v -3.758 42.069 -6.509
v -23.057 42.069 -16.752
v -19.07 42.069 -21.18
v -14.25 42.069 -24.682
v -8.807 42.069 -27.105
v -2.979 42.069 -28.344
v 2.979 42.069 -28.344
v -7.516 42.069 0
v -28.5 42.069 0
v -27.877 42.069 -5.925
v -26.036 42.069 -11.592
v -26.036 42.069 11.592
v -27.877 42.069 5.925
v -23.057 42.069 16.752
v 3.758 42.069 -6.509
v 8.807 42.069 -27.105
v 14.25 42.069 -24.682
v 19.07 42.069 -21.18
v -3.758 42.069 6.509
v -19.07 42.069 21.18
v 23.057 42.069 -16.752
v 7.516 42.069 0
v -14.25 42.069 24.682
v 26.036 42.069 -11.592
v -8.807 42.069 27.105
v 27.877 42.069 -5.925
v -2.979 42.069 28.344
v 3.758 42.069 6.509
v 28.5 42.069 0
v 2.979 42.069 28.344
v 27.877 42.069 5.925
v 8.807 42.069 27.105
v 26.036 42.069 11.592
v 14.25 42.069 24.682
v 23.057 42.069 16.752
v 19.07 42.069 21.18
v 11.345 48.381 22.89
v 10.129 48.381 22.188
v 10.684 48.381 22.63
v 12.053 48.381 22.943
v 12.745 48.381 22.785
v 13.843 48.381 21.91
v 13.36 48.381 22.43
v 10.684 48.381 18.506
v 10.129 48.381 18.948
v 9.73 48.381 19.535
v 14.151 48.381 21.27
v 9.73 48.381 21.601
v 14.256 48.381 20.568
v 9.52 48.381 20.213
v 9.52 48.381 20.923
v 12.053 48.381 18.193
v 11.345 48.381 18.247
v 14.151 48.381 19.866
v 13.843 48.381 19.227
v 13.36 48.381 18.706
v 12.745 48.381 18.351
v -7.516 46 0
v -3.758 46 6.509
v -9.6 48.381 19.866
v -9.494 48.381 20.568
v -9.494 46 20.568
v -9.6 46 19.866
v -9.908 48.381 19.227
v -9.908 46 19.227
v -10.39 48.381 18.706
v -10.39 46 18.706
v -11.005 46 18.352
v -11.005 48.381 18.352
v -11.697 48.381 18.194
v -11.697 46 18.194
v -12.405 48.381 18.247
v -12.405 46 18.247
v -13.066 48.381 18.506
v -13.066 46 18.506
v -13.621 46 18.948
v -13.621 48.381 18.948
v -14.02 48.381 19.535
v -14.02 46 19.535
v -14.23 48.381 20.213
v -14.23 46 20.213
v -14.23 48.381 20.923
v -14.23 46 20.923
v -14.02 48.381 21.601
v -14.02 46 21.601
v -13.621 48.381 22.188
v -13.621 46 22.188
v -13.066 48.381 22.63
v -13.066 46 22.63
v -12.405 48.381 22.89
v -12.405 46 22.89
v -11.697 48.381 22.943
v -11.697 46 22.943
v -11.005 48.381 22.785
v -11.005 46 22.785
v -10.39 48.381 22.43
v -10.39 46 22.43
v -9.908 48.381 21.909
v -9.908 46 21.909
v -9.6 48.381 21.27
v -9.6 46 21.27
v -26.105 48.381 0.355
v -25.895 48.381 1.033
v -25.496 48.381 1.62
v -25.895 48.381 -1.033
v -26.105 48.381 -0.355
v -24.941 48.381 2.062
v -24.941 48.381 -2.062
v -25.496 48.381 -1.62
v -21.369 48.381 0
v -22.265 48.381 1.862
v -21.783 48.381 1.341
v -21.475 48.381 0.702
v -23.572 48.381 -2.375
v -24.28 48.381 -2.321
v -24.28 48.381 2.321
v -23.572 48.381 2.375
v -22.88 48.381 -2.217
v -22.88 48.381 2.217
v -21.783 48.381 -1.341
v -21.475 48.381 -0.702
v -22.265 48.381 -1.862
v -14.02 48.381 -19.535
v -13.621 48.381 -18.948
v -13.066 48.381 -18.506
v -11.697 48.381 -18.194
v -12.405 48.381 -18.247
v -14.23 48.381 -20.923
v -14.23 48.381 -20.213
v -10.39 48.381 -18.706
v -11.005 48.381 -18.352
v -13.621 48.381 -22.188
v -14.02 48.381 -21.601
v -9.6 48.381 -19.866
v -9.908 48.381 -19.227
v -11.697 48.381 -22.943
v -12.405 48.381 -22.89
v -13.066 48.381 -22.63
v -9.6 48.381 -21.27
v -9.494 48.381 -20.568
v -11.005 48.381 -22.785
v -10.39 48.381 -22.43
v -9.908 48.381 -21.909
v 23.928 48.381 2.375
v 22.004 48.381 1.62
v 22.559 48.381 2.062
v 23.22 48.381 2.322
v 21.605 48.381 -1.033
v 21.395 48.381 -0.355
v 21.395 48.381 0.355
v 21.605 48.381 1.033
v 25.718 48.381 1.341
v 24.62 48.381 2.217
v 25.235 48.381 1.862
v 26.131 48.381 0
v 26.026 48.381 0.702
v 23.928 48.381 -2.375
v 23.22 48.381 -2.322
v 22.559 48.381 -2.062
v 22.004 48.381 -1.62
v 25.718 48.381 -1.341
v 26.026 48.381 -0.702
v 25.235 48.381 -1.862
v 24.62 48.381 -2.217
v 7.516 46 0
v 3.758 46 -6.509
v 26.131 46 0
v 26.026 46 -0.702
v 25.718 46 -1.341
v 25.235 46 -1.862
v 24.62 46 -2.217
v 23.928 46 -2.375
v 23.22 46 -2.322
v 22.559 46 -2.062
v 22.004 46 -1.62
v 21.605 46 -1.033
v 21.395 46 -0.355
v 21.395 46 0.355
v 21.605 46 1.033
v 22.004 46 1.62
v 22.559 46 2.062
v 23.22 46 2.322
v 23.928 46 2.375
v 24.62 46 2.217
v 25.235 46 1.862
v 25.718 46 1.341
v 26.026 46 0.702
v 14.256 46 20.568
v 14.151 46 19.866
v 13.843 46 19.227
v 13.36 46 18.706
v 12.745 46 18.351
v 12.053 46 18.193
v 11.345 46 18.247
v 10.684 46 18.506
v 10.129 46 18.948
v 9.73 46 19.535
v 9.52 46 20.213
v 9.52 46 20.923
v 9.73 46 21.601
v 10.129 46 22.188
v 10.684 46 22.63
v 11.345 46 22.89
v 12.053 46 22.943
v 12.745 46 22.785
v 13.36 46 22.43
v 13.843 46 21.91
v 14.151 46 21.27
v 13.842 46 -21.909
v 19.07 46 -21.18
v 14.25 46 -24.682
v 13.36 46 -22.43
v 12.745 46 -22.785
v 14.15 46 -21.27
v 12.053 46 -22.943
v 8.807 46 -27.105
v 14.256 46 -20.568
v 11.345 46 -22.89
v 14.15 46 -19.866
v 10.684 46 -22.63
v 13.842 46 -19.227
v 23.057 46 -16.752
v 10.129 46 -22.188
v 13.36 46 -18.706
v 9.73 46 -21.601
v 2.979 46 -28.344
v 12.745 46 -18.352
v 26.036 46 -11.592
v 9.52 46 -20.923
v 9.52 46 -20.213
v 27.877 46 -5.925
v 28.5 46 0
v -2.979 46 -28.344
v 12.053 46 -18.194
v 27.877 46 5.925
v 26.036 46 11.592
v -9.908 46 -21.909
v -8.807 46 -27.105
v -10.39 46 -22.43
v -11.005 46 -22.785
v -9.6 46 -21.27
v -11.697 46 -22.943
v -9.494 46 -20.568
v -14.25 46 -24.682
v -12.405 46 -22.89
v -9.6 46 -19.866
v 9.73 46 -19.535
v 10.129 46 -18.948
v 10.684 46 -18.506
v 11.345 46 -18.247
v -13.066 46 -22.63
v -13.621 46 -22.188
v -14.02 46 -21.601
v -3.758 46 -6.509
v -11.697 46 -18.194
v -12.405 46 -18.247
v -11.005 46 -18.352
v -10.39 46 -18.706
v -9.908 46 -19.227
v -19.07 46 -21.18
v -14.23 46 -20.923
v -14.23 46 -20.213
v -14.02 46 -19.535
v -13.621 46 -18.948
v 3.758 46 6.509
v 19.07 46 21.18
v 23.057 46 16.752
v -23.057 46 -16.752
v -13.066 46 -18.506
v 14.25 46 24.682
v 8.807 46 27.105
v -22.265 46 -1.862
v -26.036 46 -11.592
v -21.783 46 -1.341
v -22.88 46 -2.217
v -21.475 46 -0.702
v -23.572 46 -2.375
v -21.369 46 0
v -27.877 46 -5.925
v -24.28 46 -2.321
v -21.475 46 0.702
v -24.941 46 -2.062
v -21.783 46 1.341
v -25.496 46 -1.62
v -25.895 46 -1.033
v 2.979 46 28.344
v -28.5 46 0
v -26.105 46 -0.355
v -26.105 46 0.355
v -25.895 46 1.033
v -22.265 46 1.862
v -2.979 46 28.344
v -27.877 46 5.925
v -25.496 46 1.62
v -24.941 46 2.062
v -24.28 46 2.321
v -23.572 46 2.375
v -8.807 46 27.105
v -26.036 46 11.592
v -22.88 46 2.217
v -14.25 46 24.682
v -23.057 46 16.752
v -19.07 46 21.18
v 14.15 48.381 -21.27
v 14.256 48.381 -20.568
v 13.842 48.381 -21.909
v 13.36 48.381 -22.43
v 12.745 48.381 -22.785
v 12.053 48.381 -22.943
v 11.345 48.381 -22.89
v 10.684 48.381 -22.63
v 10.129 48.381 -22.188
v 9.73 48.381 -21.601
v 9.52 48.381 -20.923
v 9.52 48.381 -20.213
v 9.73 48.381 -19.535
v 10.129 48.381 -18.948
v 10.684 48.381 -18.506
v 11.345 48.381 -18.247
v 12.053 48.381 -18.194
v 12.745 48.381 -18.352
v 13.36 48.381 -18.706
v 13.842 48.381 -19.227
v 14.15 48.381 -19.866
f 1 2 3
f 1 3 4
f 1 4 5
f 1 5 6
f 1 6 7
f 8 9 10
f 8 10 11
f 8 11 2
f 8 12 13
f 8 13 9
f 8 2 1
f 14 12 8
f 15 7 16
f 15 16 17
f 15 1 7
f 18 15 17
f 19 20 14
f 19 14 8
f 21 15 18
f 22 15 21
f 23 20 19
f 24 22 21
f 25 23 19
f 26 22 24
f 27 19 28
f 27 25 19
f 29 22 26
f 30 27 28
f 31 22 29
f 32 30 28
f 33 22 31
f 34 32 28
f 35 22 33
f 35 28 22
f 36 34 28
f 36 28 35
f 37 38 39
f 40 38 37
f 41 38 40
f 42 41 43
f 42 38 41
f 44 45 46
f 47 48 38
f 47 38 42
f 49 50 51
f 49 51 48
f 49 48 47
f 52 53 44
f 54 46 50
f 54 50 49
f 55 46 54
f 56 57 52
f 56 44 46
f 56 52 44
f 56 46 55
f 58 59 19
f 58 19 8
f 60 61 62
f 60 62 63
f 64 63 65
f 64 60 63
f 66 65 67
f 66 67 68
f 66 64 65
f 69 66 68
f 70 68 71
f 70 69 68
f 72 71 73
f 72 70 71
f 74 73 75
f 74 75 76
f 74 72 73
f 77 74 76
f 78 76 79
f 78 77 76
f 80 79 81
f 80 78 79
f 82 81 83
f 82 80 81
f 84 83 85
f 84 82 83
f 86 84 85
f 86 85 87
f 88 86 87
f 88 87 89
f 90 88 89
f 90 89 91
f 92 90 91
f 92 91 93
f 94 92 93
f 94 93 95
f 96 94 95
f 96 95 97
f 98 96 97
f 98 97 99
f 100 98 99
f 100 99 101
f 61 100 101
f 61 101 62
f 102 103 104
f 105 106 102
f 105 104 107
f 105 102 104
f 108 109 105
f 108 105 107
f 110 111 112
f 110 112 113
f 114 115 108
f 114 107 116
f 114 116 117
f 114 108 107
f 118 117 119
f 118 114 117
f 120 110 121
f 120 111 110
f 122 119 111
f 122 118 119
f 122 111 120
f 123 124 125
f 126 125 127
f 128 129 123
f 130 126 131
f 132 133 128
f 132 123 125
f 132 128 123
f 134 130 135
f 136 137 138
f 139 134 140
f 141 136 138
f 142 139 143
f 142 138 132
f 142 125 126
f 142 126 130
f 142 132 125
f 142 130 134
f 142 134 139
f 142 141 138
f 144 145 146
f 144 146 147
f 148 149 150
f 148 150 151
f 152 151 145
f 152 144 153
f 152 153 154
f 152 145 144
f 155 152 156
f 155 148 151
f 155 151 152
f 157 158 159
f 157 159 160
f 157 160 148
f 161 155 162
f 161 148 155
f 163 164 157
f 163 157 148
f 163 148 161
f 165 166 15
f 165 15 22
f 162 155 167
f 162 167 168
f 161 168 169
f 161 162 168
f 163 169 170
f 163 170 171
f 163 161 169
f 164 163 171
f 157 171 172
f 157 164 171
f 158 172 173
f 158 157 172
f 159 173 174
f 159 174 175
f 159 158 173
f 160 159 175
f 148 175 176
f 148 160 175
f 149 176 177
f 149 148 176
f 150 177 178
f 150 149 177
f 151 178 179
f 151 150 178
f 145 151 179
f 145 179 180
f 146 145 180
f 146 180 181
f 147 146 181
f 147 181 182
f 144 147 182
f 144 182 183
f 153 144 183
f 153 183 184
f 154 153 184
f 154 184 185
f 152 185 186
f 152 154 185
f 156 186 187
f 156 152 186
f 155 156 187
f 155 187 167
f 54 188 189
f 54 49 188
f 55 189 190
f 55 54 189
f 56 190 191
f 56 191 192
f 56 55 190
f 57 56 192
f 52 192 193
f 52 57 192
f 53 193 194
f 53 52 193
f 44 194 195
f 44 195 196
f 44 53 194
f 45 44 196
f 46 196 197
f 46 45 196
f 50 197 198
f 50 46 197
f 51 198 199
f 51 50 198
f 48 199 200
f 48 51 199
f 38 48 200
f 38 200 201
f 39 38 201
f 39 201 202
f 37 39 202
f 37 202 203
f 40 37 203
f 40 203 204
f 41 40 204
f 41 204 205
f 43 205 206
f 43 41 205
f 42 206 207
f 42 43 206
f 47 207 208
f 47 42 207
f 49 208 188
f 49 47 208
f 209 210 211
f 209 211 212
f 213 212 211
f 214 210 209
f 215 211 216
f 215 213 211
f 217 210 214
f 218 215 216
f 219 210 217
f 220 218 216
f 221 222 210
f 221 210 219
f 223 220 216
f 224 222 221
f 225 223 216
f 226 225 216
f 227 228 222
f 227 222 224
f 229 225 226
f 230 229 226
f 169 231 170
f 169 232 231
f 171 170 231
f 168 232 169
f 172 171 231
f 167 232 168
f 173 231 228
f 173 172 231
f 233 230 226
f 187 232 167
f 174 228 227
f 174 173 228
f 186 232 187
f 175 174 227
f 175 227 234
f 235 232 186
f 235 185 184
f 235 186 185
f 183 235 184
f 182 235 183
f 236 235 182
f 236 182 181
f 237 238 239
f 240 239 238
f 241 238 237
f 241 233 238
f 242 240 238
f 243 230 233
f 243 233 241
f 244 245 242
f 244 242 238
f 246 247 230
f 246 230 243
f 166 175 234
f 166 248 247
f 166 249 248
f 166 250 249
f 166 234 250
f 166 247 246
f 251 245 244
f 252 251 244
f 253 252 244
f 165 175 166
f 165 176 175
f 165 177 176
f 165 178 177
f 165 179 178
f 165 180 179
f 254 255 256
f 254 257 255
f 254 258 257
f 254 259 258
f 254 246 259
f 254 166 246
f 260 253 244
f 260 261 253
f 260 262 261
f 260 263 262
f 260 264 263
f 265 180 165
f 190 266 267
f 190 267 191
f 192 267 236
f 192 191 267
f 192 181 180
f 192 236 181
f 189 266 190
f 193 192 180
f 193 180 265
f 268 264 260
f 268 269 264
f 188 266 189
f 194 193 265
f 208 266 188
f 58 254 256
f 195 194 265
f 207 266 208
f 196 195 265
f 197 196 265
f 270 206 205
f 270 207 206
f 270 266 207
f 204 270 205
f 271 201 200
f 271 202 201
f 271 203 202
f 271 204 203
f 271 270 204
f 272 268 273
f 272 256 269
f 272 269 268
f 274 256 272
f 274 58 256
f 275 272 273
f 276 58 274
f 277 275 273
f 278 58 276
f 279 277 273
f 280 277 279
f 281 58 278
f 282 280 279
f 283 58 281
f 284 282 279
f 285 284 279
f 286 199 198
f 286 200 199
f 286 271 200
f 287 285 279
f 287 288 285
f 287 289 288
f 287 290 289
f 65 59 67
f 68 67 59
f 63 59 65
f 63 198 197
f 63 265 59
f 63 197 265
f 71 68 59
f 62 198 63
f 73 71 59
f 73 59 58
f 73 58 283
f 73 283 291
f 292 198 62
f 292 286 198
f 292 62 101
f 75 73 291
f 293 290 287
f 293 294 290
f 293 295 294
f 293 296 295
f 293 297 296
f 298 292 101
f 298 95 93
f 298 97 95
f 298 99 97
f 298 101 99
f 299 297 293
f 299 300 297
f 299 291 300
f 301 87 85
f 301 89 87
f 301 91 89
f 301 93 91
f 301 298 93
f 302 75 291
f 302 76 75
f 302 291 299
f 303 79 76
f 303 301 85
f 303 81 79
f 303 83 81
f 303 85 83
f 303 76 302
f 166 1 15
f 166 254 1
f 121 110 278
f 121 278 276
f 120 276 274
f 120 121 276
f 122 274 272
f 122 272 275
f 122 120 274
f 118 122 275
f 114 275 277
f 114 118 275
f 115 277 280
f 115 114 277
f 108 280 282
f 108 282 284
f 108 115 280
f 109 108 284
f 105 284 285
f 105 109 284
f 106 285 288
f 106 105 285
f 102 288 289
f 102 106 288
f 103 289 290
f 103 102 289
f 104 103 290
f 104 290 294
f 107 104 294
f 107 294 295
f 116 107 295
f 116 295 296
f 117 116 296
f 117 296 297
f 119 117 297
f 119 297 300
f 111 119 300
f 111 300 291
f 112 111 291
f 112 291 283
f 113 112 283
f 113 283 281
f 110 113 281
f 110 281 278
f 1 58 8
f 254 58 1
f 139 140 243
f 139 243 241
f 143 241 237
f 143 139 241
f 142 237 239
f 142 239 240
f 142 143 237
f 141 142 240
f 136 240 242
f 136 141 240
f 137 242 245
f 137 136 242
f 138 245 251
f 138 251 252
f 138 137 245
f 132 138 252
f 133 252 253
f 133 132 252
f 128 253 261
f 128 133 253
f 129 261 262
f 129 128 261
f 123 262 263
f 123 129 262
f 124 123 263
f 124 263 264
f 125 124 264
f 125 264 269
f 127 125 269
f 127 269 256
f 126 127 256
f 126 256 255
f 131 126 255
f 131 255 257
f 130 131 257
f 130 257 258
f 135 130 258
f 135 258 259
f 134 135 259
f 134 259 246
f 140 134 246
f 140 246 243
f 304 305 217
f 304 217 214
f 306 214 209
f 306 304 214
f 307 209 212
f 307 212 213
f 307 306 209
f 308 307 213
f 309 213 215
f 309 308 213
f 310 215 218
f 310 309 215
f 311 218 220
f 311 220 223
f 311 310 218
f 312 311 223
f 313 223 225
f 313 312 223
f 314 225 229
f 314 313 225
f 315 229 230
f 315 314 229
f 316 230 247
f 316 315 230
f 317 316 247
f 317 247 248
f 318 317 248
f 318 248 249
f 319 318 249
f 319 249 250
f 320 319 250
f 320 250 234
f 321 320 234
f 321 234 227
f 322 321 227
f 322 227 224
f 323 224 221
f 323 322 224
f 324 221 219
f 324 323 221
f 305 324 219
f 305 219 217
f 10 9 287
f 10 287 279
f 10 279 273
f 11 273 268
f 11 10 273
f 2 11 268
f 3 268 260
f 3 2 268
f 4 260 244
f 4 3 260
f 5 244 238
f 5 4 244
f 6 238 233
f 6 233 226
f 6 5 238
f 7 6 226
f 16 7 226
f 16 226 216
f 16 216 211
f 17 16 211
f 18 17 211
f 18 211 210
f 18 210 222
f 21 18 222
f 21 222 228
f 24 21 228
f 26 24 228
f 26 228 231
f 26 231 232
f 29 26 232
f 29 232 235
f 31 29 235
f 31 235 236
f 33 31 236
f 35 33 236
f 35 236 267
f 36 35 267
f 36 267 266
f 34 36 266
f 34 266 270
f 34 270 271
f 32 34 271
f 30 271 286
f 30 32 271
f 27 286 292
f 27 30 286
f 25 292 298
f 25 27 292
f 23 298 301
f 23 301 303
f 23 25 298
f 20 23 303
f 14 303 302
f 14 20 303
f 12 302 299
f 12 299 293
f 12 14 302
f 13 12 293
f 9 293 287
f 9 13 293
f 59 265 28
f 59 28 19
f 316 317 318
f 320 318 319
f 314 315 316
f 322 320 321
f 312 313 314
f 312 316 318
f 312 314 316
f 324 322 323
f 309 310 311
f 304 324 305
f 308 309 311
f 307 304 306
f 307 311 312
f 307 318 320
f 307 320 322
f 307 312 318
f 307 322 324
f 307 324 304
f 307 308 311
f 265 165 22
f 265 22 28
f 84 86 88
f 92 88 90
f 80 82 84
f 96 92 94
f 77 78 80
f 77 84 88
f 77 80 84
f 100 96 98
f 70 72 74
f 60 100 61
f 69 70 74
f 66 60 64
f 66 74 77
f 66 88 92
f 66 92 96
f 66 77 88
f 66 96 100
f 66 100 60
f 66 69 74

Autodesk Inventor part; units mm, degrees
ref_plane "YZ Plane" through (0, 0, 0) normal (1, 0, 0) x (0, 1, 0)
ref_plane "XZ Plane" through (0, 0, 0) normal (0, 1, 0) x (-1, 0, 0)
ref_plane "XY Plane" through (0, 0, 0) normal (0, 0, 1) x (1, 0, 0)
sketch "Sketch1" plane through (0, 0, 0) normal (0, 1, 0) x (-1, 0, 0)
  circle A0 centre (0, 0) radius 28.5
  circle A1 centre (0, 0) radius 9
  circle A2 centre (11.875, 20.5681) radius 1.5875
  circle A3 centre (-11.875, 20.5681) radius 1.5875
  circle A4 centre (23.75, 0) radius 1.5875
  circle A5 centre (11.875, -20.5681) radius 1.5875
  circle A6 centre (-11.875, -20.5681) radius 1.5875
  circle A7 centre (-23.75, 0) radius 1.5875
  dimension "d5" = 3.175
  dimension "d6" = 20.5681
  dimension "d7" = 3.175
  dimension "d8" = 3.175
  dimension "d9" = 3.175
  dimension "d10" = 3.175
  dimension "d11" = 3.175
extrude "Extrusion1" add sketch "Sketch1" along normal blind 46
sketch "Sketch2" plane through (0, 46, 0) normal (0, 1, 0) x (1, 0, 0)
  line L0 (7.5157, 0) -> (3.7578, -6.5088)
  line L1 (3.7578, -6.5088) -> (-3.7578, -6.5088)
  line L2 (-3.7578, -6.5088) -> (-7.5157, 0)
  line L3 (-7.5157, 0) -> (-3.7578, 6.5088)
  line L4 (-3.7578, 6.5088) -> (3.7578, 6.5088)
  line L5 (3.7578, 6.5088) -> (7.5157, 0)
  circle A0 centre (0, 0) radius 28.5 projected
  circle A1 centre (-11.875, -20.5681) radius 1.5875 projected
  circle A2 centre (11.875, -20.5681) radius 1.5875 projected
  circle A3 centre (-23.75, 0) radius 1.5875 projected
  circle A4 centre (-11.875, 20.5681) radius 1.5875 projected
  circle A5 centre (23.75, 0) radius 1.5875 projected
  circle A6 centre (11.875, 20.5681) radius 1.5875 projected
  dimension "d4" = 13.0175
extrude "Extrusion2" add sketch "Sketch2" against normal blind 46
sketch "Sketch3" plane through (0, 46, 0) normal (0, 1, 0) x (1, 0, 0)
  circle A0 centre (-11.875, 20.5681) radius 1.5875 projected
  circle A1 centre (-11.875, 20.5681) radius 2.3812
  circle A2 centre (11.875, 20.5681) radius 1.5875 projected
  circle A3 centre (11.875, 20.5681) radius 2.3812
  circle A4 centre (23.75, 0) radius 1.5875 projected
  circle A5 centre (23.75, 0) radius 2.3813
  circle A6 centre (11.875, -20.5681) radius 1.5875 projected
  circle A7 centre (11.875, -20.5681) radius 2.3813
  circle A8 centre (-11.875, -20.5681) radius 1.5875 projected
  circle A9 centre (-11.875, -20.5681) radius 2.3812
  circle A10 centre (-23.75, 0) radius 1.5875 projected
  circle A11 centre (-23.75, 0) radius 2.3812
  point P0 (0, 0)
  dimension "d12" = 4.7625
  dimension "d13" = 4.7625
  dimension "d14" = 4.7625
  dimension "d15" = 4.7625
  dimension "d16" = 4.7625
  dimension "d17" = 4.7625
extrude "Extrusion3" add sketch "Sketch3" along normal blind 2.3813 and the other way blind 48.3807 contours A0 | A1 | A2 | A3 | A4 | A5 | A6 | A7 | A8 | A9 | A10 | A11
sketch "Sketch4" plane through (11.875, -2.3806, 20.5681) normal (0, -1, 0) x (1, 0, 0)
  circle A0 centre (-11.875, -20.5681) radius 42.5802
extrude "Extrusion4" cut sketch "Sketch4" against normal blind 44.45
equation "\"d7\" = d5"
equation "\"d8\" = d5"
equation "\"d9\" = d5"
equation "\"d10\" = d5"
equation "\"d11\" = d5"
properties part number "2 thunder axel test v1"
